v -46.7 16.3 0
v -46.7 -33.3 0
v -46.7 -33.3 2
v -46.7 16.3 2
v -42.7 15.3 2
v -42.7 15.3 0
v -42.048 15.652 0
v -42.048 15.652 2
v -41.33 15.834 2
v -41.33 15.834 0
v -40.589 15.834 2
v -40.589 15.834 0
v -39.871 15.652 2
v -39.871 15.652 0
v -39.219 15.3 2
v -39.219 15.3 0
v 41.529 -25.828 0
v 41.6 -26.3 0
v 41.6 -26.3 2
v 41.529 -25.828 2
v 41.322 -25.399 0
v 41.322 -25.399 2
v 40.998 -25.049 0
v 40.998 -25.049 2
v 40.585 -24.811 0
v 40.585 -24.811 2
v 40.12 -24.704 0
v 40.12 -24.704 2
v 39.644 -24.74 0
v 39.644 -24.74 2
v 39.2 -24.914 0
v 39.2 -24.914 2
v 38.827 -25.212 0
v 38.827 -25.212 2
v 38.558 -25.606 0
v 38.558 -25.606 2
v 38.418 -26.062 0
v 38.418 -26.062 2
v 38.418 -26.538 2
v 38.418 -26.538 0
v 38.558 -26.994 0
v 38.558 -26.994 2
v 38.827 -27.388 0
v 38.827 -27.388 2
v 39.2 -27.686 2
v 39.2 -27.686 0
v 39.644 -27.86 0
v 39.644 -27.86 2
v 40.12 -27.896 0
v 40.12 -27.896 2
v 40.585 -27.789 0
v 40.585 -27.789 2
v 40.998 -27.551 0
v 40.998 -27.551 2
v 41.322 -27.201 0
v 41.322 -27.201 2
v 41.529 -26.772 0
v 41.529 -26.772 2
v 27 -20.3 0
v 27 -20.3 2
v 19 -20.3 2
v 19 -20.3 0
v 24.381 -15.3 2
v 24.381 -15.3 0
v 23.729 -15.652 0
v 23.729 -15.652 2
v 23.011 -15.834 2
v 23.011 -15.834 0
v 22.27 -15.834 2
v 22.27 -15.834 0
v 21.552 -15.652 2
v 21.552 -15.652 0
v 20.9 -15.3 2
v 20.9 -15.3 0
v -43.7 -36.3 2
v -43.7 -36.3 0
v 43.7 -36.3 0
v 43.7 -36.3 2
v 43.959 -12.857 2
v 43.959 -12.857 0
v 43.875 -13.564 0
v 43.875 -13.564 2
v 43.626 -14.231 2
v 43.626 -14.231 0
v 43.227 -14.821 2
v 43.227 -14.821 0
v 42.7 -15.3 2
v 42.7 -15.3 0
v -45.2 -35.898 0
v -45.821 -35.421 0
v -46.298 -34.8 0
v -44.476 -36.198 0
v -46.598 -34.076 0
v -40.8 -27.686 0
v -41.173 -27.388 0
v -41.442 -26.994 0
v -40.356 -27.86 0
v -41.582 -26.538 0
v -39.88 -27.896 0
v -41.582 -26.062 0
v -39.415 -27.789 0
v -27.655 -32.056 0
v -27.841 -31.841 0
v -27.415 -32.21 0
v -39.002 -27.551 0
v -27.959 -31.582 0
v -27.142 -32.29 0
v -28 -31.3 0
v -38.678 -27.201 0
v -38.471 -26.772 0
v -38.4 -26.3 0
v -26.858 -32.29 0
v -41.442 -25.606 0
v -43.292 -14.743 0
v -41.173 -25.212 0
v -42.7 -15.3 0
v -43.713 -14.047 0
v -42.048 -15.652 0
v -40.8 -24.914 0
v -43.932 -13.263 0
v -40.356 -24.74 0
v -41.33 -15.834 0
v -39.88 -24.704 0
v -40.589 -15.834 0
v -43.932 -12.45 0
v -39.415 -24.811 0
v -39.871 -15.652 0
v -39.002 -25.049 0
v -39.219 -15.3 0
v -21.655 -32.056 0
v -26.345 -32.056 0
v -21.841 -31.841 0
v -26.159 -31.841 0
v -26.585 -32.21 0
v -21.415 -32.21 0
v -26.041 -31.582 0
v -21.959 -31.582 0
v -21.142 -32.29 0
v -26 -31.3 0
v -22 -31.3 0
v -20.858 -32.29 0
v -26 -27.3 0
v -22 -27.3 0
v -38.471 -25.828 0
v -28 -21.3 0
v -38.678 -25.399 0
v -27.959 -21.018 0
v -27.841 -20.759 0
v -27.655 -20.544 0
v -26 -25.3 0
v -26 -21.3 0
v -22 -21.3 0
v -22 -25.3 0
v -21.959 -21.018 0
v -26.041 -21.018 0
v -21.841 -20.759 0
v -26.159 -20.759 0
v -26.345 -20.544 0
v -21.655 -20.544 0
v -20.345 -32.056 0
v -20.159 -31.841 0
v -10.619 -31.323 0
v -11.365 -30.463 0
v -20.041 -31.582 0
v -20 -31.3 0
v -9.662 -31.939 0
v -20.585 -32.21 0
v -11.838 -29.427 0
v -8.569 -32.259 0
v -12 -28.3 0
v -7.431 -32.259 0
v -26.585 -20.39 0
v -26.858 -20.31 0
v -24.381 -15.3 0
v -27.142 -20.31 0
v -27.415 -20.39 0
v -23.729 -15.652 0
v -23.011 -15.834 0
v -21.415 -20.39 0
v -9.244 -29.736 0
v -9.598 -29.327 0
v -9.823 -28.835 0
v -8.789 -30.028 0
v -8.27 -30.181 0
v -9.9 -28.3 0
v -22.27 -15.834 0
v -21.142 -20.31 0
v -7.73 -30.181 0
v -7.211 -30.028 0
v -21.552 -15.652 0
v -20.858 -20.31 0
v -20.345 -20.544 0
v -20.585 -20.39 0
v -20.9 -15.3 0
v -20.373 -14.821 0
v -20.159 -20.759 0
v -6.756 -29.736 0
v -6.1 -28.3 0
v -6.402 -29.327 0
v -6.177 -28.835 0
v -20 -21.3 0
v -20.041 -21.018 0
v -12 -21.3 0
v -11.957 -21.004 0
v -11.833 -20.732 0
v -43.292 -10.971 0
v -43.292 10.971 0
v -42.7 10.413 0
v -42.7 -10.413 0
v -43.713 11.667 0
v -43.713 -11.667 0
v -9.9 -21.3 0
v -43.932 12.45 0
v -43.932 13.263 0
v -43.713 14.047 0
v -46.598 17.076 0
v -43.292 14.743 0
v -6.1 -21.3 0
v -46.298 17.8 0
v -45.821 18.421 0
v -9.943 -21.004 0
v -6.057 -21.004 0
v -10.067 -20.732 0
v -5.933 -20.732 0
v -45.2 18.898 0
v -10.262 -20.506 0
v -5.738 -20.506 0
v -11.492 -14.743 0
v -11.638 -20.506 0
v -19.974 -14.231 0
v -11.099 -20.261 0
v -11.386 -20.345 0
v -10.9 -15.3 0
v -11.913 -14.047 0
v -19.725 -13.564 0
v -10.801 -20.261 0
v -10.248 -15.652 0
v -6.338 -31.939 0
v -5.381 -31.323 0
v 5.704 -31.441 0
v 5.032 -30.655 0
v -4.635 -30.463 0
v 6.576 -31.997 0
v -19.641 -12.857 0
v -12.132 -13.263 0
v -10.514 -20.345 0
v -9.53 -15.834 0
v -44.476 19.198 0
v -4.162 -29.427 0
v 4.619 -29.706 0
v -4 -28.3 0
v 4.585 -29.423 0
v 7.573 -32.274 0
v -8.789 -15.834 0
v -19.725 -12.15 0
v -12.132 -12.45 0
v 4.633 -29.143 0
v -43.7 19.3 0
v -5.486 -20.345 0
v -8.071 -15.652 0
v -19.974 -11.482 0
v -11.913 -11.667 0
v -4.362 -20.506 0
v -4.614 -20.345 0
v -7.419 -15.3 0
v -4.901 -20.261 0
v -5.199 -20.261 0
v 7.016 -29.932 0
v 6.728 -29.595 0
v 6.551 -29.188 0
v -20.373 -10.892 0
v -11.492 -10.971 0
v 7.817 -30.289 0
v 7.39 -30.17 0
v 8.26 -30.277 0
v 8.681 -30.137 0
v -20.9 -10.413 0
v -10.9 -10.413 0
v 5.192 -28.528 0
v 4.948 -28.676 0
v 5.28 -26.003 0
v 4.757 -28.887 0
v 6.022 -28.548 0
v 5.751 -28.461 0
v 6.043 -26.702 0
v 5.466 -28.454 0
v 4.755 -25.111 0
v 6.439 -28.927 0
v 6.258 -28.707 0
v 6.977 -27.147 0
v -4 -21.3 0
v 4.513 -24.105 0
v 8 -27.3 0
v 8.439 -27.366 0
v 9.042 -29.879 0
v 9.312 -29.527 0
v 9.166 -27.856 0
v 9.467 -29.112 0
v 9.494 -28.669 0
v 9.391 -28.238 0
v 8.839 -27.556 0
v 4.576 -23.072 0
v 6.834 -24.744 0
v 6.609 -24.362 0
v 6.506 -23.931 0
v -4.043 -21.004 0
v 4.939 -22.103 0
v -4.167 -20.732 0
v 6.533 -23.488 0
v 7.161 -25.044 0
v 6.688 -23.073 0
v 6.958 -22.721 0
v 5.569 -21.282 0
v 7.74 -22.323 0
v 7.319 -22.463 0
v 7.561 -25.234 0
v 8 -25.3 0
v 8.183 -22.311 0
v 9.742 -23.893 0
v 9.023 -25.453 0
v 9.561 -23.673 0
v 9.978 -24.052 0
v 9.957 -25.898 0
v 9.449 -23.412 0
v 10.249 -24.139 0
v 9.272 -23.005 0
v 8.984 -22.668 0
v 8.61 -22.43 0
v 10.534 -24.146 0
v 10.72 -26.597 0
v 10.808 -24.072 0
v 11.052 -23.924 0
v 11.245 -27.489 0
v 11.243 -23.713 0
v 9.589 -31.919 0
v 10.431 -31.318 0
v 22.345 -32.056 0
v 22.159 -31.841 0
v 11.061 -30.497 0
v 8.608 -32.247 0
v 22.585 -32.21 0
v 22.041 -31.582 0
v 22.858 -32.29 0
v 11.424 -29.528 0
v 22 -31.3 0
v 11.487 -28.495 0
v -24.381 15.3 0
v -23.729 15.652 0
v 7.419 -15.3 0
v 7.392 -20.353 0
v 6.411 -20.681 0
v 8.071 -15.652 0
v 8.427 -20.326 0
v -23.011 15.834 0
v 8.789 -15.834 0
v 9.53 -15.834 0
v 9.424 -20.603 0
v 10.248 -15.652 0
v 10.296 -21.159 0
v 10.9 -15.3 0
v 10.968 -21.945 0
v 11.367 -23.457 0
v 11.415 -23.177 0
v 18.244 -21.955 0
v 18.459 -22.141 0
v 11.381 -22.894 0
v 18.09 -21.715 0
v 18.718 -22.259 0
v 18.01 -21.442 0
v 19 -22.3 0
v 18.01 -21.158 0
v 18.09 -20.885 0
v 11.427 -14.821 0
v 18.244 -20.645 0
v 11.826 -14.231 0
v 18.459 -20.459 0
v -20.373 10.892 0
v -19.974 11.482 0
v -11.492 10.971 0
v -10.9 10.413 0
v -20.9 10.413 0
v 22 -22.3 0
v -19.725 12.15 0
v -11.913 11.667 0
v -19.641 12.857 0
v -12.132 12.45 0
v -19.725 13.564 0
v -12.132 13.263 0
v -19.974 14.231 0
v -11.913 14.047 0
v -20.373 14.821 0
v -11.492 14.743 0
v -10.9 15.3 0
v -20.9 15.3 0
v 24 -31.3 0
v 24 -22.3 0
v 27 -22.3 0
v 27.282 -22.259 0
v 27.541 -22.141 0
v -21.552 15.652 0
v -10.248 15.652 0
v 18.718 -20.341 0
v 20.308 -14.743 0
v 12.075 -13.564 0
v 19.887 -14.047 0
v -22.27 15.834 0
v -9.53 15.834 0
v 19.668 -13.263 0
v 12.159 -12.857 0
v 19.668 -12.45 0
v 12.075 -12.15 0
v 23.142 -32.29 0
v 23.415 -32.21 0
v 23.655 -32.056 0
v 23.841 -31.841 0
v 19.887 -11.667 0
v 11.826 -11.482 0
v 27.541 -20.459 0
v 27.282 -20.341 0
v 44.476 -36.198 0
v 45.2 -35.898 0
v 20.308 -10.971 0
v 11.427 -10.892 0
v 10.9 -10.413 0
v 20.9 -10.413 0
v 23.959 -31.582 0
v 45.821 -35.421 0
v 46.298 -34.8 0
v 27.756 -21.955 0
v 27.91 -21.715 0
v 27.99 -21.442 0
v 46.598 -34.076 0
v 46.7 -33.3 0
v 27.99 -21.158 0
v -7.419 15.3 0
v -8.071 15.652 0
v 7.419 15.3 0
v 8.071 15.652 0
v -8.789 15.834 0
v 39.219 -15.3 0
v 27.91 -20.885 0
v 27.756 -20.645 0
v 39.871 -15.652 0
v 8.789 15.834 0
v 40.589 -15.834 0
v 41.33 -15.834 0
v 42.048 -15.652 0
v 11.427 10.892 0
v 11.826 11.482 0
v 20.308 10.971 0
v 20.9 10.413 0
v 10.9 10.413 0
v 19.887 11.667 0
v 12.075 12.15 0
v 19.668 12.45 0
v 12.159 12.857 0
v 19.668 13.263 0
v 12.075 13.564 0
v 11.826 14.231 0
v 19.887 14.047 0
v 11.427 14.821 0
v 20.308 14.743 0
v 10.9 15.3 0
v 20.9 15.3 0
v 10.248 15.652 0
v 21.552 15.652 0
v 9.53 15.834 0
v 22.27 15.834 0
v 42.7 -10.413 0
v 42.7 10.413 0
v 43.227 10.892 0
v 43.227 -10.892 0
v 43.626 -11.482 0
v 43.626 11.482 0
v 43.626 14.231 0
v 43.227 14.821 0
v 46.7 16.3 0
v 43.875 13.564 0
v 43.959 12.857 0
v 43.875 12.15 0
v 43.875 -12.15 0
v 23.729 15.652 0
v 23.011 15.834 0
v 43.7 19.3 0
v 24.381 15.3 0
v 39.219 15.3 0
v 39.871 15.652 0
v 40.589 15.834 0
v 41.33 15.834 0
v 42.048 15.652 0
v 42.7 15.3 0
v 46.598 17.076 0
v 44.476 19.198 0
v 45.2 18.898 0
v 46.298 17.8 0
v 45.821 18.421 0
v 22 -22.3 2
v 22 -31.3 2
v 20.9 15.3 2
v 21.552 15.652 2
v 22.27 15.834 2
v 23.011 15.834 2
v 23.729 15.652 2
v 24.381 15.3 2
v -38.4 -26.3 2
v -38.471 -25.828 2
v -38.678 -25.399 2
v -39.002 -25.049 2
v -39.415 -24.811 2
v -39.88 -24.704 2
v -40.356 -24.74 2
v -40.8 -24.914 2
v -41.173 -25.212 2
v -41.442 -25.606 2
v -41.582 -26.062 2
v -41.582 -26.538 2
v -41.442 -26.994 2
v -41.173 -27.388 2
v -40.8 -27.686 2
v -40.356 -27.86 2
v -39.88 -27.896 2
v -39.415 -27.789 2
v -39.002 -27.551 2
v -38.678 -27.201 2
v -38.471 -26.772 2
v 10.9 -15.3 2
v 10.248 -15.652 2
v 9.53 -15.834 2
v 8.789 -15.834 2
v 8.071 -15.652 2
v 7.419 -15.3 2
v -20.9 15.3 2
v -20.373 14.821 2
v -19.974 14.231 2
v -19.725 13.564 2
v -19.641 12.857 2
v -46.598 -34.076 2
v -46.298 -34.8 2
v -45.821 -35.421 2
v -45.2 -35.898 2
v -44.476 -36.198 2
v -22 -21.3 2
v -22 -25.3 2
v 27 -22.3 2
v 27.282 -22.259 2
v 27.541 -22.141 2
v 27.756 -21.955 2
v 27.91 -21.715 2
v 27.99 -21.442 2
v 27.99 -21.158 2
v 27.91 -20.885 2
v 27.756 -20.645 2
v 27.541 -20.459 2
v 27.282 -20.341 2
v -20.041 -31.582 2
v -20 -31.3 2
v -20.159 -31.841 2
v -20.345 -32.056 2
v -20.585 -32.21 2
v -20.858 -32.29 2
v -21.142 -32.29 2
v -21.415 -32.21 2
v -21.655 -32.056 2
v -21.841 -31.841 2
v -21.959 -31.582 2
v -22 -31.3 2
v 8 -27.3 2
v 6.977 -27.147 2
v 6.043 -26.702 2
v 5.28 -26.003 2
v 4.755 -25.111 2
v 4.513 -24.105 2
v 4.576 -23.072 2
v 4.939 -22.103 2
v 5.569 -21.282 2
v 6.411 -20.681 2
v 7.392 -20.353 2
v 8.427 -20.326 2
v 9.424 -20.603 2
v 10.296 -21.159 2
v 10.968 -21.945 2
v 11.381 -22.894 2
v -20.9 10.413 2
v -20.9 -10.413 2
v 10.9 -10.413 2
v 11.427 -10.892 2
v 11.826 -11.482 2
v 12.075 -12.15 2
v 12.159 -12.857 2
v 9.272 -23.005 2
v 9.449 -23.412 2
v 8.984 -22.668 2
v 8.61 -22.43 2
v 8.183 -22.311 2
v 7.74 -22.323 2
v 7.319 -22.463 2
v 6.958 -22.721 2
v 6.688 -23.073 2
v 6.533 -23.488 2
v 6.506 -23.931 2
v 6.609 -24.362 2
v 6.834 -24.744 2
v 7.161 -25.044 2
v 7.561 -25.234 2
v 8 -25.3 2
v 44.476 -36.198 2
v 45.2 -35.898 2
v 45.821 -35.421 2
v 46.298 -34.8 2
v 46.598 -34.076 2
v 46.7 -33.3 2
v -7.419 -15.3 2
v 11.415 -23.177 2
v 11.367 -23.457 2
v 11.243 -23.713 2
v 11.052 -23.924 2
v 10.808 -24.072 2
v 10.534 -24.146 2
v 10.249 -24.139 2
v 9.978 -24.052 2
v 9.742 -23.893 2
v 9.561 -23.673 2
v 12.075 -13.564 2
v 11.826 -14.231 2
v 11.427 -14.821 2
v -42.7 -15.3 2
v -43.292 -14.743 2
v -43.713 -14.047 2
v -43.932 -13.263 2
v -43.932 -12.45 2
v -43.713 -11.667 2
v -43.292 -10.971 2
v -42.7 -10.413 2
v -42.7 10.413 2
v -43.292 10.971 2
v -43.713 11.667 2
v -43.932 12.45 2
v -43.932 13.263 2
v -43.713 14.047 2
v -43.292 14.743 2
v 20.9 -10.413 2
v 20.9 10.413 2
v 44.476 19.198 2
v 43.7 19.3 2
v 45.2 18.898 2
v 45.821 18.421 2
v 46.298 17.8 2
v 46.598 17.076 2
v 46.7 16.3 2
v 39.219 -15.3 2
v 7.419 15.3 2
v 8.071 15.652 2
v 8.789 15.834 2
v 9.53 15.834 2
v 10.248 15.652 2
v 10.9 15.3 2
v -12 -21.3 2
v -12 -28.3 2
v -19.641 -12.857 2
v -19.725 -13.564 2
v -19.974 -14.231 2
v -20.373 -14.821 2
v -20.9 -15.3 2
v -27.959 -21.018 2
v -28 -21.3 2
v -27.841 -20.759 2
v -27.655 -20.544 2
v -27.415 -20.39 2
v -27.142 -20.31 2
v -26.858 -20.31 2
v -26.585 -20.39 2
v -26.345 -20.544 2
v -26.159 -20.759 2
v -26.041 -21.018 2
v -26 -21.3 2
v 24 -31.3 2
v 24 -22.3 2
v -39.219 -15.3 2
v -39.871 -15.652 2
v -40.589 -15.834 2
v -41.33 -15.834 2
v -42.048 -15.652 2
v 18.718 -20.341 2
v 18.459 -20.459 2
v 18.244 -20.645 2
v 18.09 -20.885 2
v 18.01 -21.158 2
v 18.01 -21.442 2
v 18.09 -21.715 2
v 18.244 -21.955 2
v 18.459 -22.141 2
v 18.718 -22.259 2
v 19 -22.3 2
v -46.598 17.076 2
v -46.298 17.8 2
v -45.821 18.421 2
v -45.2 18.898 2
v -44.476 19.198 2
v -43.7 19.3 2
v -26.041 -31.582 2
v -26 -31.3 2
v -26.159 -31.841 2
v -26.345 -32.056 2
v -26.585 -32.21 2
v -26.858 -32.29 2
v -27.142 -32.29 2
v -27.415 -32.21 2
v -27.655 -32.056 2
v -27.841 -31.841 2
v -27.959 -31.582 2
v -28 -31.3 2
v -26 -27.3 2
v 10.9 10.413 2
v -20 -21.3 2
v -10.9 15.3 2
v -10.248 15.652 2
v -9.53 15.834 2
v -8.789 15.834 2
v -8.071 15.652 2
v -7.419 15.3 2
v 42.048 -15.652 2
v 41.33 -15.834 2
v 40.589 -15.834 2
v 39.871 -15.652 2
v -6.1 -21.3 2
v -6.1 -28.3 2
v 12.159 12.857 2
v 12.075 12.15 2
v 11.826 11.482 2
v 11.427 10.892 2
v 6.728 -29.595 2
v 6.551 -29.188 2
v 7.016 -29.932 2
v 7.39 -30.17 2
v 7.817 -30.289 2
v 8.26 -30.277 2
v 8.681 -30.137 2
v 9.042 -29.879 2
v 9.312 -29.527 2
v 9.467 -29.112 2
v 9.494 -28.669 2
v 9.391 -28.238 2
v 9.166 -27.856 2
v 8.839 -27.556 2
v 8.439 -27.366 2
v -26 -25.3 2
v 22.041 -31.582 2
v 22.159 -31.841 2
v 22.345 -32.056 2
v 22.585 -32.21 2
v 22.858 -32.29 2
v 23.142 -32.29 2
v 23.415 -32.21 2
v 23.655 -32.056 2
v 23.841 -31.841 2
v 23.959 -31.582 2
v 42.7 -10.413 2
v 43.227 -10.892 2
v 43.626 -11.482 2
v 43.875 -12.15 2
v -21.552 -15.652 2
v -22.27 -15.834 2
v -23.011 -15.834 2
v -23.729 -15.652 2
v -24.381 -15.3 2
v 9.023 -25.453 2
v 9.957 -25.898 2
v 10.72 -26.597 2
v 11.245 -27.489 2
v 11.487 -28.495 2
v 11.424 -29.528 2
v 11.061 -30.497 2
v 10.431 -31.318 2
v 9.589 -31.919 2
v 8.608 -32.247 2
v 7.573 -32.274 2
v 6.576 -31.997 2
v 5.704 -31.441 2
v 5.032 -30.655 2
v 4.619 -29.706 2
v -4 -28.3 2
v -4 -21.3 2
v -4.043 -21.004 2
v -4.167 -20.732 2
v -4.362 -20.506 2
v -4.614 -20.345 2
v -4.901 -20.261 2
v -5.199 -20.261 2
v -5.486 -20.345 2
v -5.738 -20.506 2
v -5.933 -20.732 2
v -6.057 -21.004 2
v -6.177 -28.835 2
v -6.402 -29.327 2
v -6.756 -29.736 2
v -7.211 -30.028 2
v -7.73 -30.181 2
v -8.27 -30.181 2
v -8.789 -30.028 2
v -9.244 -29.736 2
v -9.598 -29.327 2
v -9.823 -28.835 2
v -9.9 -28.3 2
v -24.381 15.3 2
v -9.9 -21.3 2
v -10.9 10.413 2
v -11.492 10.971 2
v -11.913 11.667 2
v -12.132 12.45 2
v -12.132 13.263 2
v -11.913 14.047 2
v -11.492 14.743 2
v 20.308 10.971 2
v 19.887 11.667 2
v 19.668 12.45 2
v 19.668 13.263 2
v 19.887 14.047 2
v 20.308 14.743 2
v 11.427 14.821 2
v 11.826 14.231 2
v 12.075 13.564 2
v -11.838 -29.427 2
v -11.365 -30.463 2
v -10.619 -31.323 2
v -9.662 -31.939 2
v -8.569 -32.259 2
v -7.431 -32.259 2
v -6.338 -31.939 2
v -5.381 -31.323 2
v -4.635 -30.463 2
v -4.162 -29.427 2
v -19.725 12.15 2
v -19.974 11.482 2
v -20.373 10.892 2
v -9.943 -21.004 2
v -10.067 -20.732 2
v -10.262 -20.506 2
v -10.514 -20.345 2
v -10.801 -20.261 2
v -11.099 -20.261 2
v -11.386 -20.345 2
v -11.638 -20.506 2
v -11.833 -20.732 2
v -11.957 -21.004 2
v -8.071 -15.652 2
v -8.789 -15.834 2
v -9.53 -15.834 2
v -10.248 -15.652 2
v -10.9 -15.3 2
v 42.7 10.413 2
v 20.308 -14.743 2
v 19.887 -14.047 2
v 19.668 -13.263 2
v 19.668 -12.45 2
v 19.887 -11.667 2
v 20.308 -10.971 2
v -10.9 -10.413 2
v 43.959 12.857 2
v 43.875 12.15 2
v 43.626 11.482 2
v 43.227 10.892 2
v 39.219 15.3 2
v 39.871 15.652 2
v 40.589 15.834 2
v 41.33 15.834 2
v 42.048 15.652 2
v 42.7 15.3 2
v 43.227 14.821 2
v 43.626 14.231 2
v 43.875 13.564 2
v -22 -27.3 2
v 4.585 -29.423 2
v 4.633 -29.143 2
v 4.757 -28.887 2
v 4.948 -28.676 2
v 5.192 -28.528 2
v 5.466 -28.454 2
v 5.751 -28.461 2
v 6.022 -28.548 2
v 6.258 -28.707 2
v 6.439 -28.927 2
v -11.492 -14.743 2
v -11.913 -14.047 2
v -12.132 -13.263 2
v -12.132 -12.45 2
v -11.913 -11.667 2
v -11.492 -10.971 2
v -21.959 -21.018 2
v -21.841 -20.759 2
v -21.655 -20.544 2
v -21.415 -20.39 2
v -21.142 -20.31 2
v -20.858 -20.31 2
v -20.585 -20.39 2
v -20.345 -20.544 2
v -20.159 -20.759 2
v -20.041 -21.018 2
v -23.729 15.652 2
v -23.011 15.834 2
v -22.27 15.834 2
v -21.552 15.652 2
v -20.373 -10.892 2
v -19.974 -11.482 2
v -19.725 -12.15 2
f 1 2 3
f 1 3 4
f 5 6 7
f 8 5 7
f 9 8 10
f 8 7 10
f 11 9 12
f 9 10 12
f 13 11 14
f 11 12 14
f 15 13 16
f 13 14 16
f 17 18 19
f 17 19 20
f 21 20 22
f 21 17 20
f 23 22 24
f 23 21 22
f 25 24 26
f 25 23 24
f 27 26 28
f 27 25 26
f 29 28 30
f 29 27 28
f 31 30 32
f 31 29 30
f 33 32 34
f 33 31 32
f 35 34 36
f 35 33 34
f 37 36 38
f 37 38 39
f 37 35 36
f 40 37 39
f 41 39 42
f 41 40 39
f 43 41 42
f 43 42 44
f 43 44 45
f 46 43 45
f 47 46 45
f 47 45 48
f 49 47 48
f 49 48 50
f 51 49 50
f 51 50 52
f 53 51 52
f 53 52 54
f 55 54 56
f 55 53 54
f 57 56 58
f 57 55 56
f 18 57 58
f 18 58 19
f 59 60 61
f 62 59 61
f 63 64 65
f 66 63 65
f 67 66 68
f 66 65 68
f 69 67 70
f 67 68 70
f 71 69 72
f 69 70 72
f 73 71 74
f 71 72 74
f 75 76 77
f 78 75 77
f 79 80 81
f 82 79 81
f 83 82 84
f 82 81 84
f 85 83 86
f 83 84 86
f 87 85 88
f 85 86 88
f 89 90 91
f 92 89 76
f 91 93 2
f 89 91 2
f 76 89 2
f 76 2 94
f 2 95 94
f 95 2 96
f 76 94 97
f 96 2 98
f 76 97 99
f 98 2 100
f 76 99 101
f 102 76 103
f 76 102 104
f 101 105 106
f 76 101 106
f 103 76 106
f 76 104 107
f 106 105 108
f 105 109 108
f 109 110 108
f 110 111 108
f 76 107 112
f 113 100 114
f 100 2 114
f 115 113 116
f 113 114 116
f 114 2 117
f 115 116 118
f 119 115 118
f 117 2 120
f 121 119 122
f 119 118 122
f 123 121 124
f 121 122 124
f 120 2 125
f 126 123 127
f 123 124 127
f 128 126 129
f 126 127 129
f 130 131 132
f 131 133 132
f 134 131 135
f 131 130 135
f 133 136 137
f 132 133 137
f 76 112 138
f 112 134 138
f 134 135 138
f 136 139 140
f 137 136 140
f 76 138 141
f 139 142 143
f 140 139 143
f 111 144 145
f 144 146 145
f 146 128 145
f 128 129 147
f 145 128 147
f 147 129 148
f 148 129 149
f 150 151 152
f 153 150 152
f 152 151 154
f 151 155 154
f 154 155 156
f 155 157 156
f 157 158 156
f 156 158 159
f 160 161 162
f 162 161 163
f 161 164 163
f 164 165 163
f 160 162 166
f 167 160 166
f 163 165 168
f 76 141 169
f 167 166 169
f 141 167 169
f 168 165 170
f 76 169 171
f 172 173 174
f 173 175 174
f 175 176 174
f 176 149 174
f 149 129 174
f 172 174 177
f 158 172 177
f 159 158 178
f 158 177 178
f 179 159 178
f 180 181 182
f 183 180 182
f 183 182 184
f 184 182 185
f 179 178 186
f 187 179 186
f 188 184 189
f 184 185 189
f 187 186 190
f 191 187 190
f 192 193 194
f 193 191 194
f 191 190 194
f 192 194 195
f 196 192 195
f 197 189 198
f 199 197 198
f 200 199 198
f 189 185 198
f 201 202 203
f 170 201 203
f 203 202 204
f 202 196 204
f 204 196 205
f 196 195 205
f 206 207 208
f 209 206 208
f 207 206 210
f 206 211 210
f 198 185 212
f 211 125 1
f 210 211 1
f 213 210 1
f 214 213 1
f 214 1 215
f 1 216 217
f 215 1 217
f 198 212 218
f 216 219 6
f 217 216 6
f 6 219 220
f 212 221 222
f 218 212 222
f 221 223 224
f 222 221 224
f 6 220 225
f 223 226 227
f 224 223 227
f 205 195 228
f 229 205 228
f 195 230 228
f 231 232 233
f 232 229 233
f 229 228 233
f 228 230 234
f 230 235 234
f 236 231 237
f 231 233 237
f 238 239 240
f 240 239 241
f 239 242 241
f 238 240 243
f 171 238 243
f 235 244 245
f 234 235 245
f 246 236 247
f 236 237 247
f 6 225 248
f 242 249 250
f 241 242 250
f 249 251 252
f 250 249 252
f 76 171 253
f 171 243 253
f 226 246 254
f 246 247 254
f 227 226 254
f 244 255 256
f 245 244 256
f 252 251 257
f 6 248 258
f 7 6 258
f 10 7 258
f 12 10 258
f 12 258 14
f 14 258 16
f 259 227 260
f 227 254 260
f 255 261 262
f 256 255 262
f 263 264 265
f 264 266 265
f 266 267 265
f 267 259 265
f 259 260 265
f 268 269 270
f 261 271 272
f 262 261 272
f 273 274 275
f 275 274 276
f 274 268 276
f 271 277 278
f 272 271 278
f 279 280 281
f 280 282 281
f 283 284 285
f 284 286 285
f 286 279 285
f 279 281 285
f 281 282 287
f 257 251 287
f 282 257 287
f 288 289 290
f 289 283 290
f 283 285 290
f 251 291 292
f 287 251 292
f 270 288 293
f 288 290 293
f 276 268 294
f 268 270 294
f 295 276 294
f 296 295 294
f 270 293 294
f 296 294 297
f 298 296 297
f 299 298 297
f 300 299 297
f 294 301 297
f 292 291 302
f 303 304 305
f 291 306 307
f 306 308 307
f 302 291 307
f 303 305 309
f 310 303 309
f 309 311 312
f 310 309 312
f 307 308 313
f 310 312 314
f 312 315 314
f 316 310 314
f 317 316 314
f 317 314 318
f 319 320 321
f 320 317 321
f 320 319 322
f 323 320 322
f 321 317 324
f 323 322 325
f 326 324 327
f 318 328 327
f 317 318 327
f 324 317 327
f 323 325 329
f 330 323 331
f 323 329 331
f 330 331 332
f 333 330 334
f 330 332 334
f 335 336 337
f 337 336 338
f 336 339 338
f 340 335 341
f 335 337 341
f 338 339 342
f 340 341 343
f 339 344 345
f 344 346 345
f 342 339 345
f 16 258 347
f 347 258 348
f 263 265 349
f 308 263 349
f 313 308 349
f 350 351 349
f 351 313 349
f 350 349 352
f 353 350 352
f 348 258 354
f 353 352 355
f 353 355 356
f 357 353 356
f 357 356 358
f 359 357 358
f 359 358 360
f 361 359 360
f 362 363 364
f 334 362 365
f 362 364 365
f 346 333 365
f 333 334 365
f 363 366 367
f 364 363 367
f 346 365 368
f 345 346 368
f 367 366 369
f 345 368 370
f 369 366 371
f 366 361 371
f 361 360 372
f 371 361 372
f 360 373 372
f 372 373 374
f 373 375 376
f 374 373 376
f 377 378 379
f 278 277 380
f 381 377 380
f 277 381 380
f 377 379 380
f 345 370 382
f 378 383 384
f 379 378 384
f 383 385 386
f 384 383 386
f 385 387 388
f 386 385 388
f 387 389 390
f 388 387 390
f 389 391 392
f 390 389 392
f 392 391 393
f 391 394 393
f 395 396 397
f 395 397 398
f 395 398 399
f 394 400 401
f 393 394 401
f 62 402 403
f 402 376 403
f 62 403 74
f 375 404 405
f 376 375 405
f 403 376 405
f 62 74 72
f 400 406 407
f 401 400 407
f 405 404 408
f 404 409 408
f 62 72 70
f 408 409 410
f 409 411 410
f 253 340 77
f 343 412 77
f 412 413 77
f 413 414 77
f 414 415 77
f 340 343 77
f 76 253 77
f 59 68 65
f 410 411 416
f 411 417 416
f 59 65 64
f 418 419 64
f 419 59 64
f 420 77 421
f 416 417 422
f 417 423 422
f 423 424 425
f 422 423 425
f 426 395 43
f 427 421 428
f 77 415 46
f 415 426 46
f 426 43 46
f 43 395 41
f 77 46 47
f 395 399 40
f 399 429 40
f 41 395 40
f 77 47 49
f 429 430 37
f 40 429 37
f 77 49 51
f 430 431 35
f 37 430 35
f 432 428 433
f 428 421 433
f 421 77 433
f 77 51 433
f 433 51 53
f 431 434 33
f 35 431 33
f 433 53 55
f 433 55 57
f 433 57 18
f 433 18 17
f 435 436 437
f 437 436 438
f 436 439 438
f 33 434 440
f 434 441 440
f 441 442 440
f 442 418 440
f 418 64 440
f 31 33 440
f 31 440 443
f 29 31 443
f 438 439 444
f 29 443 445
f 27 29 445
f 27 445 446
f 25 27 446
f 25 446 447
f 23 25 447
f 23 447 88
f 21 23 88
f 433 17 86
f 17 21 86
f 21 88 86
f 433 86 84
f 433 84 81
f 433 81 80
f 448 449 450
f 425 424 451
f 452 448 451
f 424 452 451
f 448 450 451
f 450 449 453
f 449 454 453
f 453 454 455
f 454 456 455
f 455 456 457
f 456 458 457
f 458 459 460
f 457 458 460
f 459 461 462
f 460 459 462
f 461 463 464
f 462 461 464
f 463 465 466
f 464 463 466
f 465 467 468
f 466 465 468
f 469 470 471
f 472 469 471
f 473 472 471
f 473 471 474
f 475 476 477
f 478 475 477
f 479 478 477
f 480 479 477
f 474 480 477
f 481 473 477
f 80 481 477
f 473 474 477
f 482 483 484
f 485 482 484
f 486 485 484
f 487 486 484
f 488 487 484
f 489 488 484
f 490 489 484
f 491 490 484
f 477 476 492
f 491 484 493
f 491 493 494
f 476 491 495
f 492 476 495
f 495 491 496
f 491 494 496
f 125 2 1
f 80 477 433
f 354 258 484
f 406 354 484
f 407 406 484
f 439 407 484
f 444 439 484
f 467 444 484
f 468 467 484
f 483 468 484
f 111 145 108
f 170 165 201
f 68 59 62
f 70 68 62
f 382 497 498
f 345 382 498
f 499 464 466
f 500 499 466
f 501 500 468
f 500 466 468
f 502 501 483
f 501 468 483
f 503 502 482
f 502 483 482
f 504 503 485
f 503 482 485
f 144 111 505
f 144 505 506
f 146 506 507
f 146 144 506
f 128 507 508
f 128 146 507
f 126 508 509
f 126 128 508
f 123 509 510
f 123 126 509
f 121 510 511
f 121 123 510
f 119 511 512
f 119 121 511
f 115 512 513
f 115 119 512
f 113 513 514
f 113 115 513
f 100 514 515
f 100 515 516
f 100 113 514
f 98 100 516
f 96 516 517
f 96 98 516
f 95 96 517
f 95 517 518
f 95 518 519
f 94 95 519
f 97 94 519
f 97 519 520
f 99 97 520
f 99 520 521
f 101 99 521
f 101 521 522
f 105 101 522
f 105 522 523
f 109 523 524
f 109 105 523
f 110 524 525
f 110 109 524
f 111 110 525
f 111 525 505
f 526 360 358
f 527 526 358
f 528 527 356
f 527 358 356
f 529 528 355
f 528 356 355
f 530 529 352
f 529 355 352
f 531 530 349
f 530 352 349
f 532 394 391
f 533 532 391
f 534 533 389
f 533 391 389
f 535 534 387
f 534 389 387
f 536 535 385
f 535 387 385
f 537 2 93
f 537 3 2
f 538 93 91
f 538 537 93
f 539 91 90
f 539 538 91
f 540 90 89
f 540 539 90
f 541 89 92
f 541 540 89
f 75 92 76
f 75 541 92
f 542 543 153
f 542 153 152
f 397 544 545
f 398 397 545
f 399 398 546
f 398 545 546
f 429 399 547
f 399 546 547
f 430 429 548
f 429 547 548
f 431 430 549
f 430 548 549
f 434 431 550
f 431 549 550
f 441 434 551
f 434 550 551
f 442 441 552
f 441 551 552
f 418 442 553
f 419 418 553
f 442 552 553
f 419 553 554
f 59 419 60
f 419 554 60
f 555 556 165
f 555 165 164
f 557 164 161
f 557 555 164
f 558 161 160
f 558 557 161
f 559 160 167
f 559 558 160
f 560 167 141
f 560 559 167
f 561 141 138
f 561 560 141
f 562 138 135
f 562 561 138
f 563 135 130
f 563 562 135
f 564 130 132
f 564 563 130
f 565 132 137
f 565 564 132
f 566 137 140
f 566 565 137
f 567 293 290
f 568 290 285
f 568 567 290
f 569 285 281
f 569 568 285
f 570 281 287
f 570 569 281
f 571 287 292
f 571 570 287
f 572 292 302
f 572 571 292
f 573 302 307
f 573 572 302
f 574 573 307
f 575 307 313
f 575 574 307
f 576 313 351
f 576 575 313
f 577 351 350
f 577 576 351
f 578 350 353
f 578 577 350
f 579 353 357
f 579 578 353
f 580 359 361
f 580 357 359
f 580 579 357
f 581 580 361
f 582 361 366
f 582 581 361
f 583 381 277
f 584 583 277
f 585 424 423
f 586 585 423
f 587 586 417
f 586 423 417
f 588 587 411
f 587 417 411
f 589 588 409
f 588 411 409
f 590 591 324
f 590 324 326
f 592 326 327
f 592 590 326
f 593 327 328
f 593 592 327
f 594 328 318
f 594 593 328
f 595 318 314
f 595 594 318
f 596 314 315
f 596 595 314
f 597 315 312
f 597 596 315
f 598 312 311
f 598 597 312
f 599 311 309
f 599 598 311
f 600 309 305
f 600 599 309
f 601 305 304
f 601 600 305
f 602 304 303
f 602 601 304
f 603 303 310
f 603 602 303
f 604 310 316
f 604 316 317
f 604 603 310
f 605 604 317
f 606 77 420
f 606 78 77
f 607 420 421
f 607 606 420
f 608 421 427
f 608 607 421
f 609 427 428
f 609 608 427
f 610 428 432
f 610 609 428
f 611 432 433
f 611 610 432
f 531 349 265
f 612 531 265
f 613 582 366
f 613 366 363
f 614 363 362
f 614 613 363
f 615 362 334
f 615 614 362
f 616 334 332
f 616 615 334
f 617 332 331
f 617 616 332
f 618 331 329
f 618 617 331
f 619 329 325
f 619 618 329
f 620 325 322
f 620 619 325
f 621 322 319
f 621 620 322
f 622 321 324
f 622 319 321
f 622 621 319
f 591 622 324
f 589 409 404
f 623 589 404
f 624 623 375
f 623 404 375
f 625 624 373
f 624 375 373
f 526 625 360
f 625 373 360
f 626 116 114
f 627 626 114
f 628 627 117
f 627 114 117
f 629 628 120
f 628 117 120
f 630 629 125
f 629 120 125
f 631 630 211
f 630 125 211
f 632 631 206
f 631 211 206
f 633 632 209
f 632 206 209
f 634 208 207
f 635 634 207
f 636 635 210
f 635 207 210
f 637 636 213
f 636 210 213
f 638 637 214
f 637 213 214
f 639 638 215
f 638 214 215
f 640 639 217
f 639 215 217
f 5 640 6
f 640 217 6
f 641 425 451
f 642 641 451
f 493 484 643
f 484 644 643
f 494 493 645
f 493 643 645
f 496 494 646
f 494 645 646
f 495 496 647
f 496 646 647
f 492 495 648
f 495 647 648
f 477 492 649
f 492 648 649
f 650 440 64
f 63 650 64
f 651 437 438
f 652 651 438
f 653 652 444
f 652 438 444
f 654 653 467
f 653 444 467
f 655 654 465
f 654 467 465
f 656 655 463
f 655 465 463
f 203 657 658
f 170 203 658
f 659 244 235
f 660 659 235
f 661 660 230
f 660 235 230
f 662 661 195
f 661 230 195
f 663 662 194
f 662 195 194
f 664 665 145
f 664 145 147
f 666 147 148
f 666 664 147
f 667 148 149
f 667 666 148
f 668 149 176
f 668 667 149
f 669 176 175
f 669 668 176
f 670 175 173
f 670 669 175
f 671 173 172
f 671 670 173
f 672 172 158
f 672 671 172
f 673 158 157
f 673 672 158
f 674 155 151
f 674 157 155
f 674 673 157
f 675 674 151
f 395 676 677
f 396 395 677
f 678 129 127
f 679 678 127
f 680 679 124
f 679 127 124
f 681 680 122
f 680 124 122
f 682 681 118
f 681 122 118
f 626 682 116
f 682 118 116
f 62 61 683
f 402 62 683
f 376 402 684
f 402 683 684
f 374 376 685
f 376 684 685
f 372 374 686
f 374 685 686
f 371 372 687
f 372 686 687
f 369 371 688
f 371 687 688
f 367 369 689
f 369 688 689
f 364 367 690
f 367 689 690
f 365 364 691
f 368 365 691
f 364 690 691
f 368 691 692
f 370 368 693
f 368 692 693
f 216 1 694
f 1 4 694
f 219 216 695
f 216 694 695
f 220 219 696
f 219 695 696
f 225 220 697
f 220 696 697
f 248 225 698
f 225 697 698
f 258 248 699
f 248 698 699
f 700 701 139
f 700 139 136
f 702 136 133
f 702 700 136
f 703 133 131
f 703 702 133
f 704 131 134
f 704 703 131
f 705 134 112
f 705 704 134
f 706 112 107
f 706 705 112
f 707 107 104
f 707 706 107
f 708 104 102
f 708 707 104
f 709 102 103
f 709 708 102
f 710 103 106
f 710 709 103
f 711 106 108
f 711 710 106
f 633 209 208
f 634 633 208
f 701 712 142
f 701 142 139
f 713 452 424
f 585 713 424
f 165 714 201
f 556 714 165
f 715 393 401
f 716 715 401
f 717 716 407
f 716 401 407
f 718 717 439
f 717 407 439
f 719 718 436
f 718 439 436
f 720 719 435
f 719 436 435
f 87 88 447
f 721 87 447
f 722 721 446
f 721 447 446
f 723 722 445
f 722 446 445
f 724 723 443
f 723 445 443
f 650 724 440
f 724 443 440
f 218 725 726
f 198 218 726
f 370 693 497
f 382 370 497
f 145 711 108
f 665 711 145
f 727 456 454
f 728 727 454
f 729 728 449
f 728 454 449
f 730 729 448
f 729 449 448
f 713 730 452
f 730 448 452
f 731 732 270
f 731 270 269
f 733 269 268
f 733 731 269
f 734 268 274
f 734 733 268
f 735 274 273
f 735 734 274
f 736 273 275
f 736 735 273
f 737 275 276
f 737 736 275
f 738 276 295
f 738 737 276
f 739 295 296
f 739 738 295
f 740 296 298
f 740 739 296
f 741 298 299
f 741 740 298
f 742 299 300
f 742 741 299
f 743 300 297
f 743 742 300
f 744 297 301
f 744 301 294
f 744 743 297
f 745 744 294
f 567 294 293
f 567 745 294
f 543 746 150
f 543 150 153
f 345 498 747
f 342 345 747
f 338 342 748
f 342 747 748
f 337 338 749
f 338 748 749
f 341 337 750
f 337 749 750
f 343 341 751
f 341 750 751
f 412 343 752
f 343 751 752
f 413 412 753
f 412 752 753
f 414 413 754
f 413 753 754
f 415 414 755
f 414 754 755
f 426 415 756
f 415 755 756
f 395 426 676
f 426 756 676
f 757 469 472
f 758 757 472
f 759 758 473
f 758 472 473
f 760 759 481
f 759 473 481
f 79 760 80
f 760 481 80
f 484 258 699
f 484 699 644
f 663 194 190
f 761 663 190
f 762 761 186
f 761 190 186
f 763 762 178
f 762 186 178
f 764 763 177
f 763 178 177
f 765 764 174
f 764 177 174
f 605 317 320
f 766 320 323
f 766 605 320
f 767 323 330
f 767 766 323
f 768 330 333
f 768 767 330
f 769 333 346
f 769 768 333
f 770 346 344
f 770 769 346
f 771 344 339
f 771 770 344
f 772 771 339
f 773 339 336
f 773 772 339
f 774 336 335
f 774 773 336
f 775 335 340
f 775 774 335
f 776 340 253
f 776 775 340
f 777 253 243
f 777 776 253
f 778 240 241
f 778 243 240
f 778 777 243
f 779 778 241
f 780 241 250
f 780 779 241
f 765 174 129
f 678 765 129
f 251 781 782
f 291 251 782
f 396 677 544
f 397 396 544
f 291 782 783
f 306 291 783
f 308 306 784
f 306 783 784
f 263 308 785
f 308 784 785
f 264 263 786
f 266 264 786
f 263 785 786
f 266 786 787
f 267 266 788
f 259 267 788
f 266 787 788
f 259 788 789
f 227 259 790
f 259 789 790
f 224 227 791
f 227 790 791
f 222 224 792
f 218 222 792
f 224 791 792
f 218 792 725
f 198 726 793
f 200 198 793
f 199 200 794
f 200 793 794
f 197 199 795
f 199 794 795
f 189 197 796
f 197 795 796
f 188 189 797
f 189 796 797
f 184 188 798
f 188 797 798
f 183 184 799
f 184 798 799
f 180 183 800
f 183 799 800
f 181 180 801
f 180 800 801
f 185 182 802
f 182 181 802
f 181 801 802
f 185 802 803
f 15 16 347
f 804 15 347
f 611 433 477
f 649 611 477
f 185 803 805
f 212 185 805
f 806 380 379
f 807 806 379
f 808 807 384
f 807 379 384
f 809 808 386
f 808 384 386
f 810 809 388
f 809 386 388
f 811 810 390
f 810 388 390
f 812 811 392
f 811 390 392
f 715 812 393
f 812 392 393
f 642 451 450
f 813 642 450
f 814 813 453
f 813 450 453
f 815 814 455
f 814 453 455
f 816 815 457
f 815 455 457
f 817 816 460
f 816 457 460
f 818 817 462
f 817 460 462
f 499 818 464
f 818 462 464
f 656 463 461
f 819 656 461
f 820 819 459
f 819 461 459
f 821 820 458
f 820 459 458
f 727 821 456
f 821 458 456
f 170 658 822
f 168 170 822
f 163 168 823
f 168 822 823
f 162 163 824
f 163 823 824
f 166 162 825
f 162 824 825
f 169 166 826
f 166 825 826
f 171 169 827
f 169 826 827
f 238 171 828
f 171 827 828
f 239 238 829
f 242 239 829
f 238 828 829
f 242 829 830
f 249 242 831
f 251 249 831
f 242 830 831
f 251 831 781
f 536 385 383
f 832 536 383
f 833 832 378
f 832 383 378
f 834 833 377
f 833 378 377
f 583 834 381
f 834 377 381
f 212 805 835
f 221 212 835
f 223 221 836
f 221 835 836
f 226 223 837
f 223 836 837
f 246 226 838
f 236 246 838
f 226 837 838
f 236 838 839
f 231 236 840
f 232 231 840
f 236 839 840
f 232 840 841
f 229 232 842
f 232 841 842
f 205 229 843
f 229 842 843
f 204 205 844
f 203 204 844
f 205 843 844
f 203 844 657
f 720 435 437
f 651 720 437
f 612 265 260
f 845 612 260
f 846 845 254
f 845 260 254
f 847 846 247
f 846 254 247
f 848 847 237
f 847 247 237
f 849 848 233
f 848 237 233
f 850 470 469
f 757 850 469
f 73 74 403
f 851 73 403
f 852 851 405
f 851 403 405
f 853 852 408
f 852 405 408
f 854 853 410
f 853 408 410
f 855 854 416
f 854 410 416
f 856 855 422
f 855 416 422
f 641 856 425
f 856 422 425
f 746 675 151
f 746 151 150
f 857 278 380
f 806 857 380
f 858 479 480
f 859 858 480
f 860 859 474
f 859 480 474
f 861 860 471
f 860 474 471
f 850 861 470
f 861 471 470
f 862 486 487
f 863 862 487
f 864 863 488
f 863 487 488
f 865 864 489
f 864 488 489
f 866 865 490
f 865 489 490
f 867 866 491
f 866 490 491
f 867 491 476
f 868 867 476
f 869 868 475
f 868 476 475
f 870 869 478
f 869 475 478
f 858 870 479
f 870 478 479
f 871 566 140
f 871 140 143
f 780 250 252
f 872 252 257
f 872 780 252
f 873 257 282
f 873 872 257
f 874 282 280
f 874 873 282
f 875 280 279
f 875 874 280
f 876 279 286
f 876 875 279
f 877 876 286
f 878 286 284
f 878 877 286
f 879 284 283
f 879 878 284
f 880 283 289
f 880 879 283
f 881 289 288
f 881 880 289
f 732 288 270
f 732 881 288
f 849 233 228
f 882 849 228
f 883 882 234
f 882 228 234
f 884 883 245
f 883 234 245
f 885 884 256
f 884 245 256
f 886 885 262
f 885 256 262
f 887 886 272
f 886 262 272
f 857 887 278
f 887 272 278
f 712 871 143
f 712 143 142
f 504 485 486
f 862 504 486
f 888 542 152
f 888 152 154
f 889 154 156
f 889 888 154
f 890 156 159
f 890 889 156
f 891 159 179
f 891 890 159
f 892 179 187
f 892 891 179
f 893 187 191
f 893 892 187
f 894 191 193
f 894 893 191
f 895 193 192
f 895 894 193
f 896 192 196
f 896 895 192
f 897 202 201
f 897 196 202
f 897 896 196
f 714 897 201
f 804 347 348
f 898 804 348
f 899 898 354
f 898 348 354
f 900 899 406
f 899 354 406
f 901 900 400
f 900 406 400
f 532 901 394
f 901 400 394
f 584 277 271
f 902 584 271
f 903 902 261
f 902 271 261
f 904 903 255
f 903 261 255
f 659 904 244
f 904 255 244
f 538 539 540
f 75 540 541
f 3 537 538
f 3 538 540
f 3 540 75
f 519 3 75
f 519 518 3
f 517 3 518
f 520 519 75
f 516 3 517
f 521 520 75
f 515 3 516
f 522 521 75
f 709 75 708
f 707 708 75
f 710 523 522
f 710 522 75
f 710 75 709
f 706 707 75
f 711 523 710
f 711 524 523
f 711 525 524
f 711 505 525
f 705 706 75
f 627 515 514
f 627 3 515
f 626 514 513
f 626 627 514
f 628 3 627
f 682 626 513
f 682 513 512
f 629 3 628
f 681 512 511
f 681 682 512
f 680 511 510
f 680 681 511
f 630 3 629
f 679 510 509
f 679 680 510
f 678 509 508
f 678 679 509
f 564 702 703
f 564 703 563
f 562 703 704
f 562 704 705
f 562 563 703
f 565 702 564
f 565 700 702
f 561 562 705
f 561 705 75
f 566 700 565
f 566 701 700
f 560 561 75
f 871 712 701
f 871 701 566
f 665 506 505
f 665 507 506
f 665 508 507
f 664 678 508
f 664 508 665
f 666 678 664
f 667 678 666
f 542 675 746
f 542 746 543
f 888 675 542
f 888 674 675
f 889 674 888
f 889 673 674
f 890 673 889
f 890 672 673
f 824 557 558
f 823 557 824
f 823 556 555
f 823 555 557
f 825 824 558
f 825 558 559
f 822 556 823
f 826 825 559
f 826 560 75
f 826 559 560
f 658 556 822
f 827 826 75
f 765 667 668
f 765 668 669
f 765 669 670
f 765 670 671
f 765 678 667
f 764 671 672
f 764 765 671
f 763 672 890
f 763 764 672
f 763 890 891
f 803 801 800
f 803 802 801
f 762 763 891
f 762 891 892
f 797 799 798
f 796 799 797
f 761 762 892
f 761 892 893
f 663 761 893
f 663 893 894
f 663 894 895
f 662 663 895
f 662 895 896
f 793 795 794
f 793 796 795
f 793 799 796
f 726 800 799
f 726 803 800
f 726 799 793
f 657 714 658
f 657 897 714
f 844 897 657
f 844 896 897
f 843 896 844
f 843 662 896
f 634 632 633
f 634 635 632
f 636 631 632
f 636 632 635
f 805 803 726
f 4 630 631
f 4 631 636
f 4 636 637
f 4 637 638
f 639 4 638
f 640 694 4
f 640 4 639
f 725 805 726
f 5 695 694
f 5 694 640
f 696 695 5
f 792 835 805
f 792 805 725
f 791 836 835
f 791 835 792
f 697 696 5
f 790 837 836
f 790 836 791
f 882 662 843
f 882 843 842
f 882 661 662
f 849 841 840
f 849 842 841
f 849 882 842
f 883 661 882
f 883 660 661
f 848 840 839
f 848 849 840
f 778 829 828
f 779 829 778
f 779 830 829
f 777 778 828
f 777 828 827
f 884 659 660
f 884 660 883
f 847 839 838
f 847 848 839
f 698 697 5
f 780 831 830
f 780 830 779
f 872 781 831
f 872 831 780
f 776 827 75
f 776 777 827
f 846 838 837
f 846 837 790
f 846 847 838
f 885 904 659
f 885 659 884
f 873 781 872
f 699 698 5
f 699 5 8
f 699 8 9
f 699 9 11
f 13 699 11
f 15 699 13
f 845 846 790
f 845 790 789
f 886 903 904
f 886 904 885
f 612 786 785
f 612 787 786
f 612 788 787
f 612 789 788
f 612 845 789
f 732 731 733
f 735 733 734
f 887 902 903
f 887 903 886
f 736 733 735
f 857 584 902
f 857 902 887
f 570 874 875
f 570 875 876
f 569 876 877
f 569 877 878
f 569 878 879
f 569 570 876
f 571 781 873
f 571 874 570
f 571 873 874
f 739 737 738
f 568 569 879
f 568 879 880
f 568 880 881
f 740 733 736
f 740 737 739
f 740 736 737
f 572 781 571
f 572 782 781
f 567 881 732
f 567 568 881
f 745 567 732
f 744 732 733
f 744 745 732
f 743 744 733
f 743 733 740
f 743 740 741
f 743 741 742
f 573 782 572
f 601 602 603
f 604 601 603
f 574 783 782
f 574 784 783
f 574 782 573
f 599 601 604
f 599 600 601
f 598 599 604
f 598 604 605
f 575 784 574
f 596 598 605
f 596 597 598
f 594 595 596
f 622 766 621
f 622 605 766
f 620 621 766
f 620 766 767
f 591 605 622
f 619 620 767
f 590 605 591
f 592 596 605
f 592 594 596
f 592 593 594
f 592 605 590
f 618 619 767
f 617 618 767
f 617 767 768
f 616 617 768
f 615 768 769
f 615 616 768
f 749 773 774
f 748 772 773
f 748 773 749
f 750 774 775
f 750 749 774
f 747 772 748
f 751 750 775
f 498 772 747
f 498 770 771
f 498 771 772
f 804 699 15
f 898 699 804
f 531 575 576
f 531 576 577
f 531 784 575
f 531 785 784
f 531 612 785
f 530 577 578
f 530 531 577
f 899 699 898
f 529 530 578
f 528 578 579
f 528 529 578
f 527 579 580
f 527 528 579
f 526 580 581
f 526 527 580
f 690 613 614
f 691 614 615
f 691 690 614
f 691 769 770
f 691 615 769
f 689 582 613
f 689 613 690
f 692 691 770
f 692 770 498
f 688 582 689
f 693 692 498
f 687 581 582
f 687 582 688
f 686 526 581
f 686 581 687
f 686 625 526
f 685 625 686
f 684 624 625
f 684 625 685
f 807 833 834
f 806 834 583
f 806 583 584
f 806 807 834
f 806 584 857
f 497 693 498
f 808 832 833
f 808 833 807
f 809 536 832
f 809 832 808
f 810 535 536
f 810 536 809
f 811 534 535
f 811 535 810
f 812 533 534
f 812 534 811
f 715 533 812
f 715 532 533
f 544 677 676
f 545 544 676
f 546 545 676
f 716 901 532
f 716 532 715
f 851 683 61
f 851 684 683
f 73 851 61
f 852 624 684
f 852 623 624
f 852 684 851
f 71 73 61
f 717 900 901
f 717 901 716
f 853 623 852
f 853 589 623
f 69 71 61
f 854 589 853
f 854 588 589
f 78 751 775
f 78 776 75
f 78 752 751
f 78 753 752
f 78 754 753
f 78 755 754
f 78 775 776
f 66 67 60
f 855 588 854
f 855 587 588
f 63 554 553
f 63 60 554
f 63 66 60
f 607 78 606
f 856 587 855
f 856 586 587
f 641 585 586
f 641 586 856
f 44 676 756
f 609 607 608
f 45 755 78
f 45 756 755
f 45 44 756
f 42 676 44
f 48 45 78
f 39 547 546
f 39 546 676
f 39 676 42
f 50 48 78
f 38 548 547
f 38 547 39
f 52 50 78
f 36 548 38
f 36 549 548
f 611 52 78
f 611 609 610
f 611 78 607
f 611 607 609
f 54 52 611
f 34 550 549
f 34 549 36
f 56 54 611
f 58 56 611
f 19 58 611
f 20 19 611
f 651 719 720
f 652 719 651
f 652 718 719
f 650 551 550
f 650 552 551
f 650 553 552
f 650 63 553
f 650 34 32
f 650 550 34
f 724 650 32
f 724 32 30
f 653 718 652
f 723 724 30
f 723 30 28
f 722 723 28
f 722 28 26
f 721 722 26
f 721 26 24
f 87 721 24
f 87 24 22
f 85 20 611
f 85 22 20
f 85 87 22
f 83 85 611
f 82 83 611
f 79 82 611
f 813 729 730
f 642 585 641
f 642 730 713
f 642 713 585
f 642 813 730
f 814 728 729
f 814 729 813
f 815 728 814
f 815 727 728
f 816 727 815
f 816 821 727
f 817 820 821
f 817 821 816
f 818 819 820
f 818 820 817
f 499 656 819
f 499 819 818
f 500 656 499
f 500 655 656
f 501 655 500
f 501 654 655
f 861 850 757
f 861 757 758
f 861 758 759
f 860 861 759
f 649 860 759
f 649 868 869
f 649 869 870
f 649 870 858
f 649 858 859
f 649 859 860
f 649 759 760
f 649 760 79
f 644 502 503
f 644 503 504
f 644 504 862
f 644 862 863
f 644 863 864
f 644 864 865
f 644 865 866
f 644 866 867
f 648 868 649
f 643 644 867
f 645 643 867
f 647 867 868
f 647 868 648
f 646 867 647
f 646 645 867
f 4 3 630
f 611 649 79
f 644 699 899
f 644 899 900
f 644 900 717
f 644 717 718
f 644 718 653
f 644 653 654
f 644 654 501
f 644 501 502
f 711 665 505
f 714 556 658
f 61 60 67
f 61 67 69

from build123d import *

# Parameters (mm, degrees)
SKETCH_1_W          = 93.4
SKETCH_1_H          = 55.6
SKETCH_1_R          = 1.6
EXTRUDE_1_DEPTH     = 2
CUT_EXTRUDE_1_DEPTH = 60.182598794
FILLET_1_R          = 3


with BuildPart() as part:
    # 草图1 → 凸台-拉伸1 (new body)
    with BuildSketch(Plane.XY):
        with Locations((0, -8.5)):
            Rectangle(SKETCH_1_W, SKETCH_1_H)
        with Locations((-40, -26.3)):
            Circle(SKETCH_1_R, mode=Mode.SUBTRACT)
        with Locations((40, -26.3)):
            Circle(SKETCH_1_R, mode=Mode.SUBTRACT)
        with BuildLine():
            ThreePointArc((-42.7, 10.41328679), (-43.95930804, 12.856643395), (-42.7, 15.3))
            ThreePointArc((-42.7, 15.3), (-40.95930804, 15.856643395), (-39.218616079, 15.3))
            Line((-39.218616079, 15.3), (-24.381383921, 15.3))
            ThreePointArc((-24.381383921, 15.3), (-22.64069196, 15.856643395), (-20.9, 15.3))
            ThreePointArc((-20.9, 15.3), (-19.974039013, 14.231038556), (-19.64069196, 12.856643395))
            ThreePointArc((-19.64069196, 12.856643395), (-19.974039013, 11.482248234), (-20.9, 10.41328679))
            Line((-20.9, 10.41328679), (-20.9, -10.41328679))
            ThreePointArc((-20.9, -10.41328679), (-19.974039013, -11.482248234), (-19.64069196, -12.856643395))
            ThreePointArc((-19.64069196, -12.856643395), (-19.974039013, -14.231038556), (-20.9, -15.3))
            ThreePointArc((-20.9, -15.3), (-22.64069196, -15.856643395), (-24.381383921, -15.3))
            Line((-24.381383921, -15.3), (-39.218616079, -15.3))
            ThreePointArc((-39.218616079, -15.3), (-40.95930804, -15.856643395), (-42.7, -15.3))
            ThreePointArc((-42.7, -15.3), (-43.95930804, -12.856643395), (-42.7, -10.41328679))
            Line((-42.7, -10.41328679), (-42.7, 10.41328679))
        make_face(mode=Mode.SUBTRACT)
        with BuildLine():
            ThreePointArc((-10.9, 10.41328679), (-12.15930804, 12.856643395), (-10.9, 15.3))
            ThreePointArc((-10.9, 15.3), (-9.15930804, 15.856643395), (-7.418616079, 15.3))
            Line((-7.418616079, 15.3), (7.418616079, 15.3))
            ThreePointArc((7.418616079, 15.3), (9.15930804, 15.856643395), (10.9, 15.3))
            ThreePointArc((10.9, 15.3), (11.825960987, 14.231038556), (12.15930804, 12.856643395))
            ThreePointArc((12.15930804, 12.856643395), (11.825960987, 11.482248234), (10.9, 10.41328679))
            Line((10.9, 10.41328679), (10.9, -10.41328679))
            ThreePointArc((10.9, -10.41328679), (11.825960987, -11.482248234), (12.15930804, -12.856643395))
            ThreePointArc((12.15930804, -12.856643395), (11.825960987, -14.231038556), (10.9, -15.3))
            ThreePointArc((10.9, -15.3), (9.15930804, -15.856643395), (7.418616079, -15.3))
            Line((7.418616079, -15.3), (-7.418616079, -15.3))
            ThreePointArc((-7.418616079, -15.3), (-9.15930804, -15.856643395), (-10.9, -15.3))
            ThreePointArc((-10.9, -15.3), (-12.15930804, -12.856643395), (-10.9, -10.41328679))
            Line((-10.9, -10.41328679), (-10.9, 10.41328679))
        make_face(mode=Mode.SUBTRACT)
        with BuildLine():
            ThreePointArc((20.9, 10.41328679), (19.64069196, 12.856643395), (20.9, 15.3))
            ThreePointArc((20.9, 15.3), (22.64069196, 15.856643395), (24.381383921, 15.3))
            Line((24.381383921, 15.3), (39.218616079, 15.3))
            ThreePointArc((39.218616079, 15.3), (40.95930804, 15.856643395), (42.7, 15.3))
            ThreePointArc((42.7, 15.3), (43.625960987, 14.231038556), (43.95930804, 12.856643395))
            ThreePointArc((43.95930804, 12.856643395), (43.625960987, 11.482248234), (42.7, 10.41328679))
            Line((42.7, 10.41328679), (42.7, -10.41328679))
            ThreePointArc((42.7, -10.41328679), (43.625960987, -11.482248234), (43.95930804, -12.856643395))
            ThreePointArc((43.95930804, -12.856643395), (43.625960987, -14.231038556), (42.7, -15.3))
            ThreePointArc((42.7, -15.3), (40.95930804, -15.856643395), (39.218616079, -15.3))
            Line((39.218616079, -15.3), (24.381383921, -15.3))
            ThreePointArc((24.381383921, -15.3), (22.64069196, -15.856643395), (20.9, -15.3))
            ThreePointArc((20.9, -15.3), (19.64069196, -12.856643395), (20.9, -10.41328679))
            Line((20.9, -10.41328679), (20.9, 10.41328679))
        make_face(mode=Mode.SUBTRACT)
    extrude(amount=EXTRUDE_1_DEPTH)

    # 草图2 → 切除-拉伸1 (cut, through all)
    with BuildSketch(Plane.XY.offset(2)):
        with BuildLine():
            Line((-28, -31.3), (-28, -21.3))
            ThreePointArc((-28, -21.3), (-27, -20.3), (-26, -21.3))
            Line((-26, -21.3), (-26, -25.3))
            Line((-26, -25.3), (-22, -25.3))
            Line((-22, -25.3), (-22, -21.3))
            ThreePointArc((-22, -21.3), (-21, -20.3), (-20, -21.3))
            Line((-20, -21.3), (-20, -31.3))
            ThreePointArc((-20, -31.3), (-21, -32.3), (-22, -31.3))
            Line((-22, -31.3), (-22, -27.3))
            Line((-22, -27.3), (-26, -27.3))
            Line((-26, -27.3), (-26, -31.3))
            ThreePointArc((-26, -31.3), (-27, -32.3), (-28, -31.3))
        make_face()
        with BuildLine():
            Line((-12, -21.3), (-12, -28.3))
            ThreePointArc((-12, -28.3), (-8, -32.3), (-4, -28.3))
            Line((-4, -28.3), (-4, -21.3))
            ThreePointArc((-4, -21.3), (-5.05, -20.25), (-6.1, -21.3))
            Line((-6.1, -21.3), (-6.1, -28.3))
            ThreePointArc((-6.1, -28.3), (-8, -30.2), (-9.9, -28.3))
            Line((-9.9, -28.3), (-9.9, -21.3))
            ThreePointArc((-9.9, -21.3), (-10.95, -20.25), (-12, -21.3))
        make_face()
        with BuildLine():
            Line((19, -22.3), (22, -22.3))
            Line((22, -22.3), (22, -31.3))
            ThreePointArc((22, -31.3), (23, -32.3), (24, -31.3))
            Line((24, -31.3), (24, -22.3))
            Line((24, -22.3), (27, -22.3))
            ThreePointArc((27, -22.3), (28, -21.3), (27, -20.3))
            Line((27, -20.3), (19, -20.3))
            ThreePointArc((19, -20.3), (18, -21.3), (19, -22.3))
        make_face()
        with BuildLine():
            ThreePointArc((8, -25.3), (10.776736691, -30.930665002), (4.619259608, -29.705866658))
            ThreePointArc((4.619259608, -29.705866658), (5.326366389, -28.481121786), (6.551111261, -29.188228568))
            ThreePointArc((6.551111261, -29.188228568), (9.19003001, -29.713142144), (8, -27.3))
            ThreePointArc((8, -27.3), (5.223263309, -21.669334998), (11.380740392, -22.894133342))
            ThreePointArc((11.380740392, -22.894133342), (10.673633611, -24.118878214), (9.448888739, -23.411771432))
            ThreePointArc((9.448888739, -23.411771432), (6.80996999, -22.886857856), (8, -25.3))
        make_face()
    extrude(amount=-CUT_EXTRUDE_1_DEPTH, mode=Mode.SUBTRACT)

    # 圆角1
    fillet_1_edges = [part.edges().sort_by_distance(p)[0] for p in [
        (-46.7, -36.3, 1),
        (-46.7, 19.3, 1),
        (46.7, 19.3, 1),
        (46.7, -36.3, 1),
    ]]
    fillet(fillet_1_edges, radius=FILLET_1_R)


solid = part.part
